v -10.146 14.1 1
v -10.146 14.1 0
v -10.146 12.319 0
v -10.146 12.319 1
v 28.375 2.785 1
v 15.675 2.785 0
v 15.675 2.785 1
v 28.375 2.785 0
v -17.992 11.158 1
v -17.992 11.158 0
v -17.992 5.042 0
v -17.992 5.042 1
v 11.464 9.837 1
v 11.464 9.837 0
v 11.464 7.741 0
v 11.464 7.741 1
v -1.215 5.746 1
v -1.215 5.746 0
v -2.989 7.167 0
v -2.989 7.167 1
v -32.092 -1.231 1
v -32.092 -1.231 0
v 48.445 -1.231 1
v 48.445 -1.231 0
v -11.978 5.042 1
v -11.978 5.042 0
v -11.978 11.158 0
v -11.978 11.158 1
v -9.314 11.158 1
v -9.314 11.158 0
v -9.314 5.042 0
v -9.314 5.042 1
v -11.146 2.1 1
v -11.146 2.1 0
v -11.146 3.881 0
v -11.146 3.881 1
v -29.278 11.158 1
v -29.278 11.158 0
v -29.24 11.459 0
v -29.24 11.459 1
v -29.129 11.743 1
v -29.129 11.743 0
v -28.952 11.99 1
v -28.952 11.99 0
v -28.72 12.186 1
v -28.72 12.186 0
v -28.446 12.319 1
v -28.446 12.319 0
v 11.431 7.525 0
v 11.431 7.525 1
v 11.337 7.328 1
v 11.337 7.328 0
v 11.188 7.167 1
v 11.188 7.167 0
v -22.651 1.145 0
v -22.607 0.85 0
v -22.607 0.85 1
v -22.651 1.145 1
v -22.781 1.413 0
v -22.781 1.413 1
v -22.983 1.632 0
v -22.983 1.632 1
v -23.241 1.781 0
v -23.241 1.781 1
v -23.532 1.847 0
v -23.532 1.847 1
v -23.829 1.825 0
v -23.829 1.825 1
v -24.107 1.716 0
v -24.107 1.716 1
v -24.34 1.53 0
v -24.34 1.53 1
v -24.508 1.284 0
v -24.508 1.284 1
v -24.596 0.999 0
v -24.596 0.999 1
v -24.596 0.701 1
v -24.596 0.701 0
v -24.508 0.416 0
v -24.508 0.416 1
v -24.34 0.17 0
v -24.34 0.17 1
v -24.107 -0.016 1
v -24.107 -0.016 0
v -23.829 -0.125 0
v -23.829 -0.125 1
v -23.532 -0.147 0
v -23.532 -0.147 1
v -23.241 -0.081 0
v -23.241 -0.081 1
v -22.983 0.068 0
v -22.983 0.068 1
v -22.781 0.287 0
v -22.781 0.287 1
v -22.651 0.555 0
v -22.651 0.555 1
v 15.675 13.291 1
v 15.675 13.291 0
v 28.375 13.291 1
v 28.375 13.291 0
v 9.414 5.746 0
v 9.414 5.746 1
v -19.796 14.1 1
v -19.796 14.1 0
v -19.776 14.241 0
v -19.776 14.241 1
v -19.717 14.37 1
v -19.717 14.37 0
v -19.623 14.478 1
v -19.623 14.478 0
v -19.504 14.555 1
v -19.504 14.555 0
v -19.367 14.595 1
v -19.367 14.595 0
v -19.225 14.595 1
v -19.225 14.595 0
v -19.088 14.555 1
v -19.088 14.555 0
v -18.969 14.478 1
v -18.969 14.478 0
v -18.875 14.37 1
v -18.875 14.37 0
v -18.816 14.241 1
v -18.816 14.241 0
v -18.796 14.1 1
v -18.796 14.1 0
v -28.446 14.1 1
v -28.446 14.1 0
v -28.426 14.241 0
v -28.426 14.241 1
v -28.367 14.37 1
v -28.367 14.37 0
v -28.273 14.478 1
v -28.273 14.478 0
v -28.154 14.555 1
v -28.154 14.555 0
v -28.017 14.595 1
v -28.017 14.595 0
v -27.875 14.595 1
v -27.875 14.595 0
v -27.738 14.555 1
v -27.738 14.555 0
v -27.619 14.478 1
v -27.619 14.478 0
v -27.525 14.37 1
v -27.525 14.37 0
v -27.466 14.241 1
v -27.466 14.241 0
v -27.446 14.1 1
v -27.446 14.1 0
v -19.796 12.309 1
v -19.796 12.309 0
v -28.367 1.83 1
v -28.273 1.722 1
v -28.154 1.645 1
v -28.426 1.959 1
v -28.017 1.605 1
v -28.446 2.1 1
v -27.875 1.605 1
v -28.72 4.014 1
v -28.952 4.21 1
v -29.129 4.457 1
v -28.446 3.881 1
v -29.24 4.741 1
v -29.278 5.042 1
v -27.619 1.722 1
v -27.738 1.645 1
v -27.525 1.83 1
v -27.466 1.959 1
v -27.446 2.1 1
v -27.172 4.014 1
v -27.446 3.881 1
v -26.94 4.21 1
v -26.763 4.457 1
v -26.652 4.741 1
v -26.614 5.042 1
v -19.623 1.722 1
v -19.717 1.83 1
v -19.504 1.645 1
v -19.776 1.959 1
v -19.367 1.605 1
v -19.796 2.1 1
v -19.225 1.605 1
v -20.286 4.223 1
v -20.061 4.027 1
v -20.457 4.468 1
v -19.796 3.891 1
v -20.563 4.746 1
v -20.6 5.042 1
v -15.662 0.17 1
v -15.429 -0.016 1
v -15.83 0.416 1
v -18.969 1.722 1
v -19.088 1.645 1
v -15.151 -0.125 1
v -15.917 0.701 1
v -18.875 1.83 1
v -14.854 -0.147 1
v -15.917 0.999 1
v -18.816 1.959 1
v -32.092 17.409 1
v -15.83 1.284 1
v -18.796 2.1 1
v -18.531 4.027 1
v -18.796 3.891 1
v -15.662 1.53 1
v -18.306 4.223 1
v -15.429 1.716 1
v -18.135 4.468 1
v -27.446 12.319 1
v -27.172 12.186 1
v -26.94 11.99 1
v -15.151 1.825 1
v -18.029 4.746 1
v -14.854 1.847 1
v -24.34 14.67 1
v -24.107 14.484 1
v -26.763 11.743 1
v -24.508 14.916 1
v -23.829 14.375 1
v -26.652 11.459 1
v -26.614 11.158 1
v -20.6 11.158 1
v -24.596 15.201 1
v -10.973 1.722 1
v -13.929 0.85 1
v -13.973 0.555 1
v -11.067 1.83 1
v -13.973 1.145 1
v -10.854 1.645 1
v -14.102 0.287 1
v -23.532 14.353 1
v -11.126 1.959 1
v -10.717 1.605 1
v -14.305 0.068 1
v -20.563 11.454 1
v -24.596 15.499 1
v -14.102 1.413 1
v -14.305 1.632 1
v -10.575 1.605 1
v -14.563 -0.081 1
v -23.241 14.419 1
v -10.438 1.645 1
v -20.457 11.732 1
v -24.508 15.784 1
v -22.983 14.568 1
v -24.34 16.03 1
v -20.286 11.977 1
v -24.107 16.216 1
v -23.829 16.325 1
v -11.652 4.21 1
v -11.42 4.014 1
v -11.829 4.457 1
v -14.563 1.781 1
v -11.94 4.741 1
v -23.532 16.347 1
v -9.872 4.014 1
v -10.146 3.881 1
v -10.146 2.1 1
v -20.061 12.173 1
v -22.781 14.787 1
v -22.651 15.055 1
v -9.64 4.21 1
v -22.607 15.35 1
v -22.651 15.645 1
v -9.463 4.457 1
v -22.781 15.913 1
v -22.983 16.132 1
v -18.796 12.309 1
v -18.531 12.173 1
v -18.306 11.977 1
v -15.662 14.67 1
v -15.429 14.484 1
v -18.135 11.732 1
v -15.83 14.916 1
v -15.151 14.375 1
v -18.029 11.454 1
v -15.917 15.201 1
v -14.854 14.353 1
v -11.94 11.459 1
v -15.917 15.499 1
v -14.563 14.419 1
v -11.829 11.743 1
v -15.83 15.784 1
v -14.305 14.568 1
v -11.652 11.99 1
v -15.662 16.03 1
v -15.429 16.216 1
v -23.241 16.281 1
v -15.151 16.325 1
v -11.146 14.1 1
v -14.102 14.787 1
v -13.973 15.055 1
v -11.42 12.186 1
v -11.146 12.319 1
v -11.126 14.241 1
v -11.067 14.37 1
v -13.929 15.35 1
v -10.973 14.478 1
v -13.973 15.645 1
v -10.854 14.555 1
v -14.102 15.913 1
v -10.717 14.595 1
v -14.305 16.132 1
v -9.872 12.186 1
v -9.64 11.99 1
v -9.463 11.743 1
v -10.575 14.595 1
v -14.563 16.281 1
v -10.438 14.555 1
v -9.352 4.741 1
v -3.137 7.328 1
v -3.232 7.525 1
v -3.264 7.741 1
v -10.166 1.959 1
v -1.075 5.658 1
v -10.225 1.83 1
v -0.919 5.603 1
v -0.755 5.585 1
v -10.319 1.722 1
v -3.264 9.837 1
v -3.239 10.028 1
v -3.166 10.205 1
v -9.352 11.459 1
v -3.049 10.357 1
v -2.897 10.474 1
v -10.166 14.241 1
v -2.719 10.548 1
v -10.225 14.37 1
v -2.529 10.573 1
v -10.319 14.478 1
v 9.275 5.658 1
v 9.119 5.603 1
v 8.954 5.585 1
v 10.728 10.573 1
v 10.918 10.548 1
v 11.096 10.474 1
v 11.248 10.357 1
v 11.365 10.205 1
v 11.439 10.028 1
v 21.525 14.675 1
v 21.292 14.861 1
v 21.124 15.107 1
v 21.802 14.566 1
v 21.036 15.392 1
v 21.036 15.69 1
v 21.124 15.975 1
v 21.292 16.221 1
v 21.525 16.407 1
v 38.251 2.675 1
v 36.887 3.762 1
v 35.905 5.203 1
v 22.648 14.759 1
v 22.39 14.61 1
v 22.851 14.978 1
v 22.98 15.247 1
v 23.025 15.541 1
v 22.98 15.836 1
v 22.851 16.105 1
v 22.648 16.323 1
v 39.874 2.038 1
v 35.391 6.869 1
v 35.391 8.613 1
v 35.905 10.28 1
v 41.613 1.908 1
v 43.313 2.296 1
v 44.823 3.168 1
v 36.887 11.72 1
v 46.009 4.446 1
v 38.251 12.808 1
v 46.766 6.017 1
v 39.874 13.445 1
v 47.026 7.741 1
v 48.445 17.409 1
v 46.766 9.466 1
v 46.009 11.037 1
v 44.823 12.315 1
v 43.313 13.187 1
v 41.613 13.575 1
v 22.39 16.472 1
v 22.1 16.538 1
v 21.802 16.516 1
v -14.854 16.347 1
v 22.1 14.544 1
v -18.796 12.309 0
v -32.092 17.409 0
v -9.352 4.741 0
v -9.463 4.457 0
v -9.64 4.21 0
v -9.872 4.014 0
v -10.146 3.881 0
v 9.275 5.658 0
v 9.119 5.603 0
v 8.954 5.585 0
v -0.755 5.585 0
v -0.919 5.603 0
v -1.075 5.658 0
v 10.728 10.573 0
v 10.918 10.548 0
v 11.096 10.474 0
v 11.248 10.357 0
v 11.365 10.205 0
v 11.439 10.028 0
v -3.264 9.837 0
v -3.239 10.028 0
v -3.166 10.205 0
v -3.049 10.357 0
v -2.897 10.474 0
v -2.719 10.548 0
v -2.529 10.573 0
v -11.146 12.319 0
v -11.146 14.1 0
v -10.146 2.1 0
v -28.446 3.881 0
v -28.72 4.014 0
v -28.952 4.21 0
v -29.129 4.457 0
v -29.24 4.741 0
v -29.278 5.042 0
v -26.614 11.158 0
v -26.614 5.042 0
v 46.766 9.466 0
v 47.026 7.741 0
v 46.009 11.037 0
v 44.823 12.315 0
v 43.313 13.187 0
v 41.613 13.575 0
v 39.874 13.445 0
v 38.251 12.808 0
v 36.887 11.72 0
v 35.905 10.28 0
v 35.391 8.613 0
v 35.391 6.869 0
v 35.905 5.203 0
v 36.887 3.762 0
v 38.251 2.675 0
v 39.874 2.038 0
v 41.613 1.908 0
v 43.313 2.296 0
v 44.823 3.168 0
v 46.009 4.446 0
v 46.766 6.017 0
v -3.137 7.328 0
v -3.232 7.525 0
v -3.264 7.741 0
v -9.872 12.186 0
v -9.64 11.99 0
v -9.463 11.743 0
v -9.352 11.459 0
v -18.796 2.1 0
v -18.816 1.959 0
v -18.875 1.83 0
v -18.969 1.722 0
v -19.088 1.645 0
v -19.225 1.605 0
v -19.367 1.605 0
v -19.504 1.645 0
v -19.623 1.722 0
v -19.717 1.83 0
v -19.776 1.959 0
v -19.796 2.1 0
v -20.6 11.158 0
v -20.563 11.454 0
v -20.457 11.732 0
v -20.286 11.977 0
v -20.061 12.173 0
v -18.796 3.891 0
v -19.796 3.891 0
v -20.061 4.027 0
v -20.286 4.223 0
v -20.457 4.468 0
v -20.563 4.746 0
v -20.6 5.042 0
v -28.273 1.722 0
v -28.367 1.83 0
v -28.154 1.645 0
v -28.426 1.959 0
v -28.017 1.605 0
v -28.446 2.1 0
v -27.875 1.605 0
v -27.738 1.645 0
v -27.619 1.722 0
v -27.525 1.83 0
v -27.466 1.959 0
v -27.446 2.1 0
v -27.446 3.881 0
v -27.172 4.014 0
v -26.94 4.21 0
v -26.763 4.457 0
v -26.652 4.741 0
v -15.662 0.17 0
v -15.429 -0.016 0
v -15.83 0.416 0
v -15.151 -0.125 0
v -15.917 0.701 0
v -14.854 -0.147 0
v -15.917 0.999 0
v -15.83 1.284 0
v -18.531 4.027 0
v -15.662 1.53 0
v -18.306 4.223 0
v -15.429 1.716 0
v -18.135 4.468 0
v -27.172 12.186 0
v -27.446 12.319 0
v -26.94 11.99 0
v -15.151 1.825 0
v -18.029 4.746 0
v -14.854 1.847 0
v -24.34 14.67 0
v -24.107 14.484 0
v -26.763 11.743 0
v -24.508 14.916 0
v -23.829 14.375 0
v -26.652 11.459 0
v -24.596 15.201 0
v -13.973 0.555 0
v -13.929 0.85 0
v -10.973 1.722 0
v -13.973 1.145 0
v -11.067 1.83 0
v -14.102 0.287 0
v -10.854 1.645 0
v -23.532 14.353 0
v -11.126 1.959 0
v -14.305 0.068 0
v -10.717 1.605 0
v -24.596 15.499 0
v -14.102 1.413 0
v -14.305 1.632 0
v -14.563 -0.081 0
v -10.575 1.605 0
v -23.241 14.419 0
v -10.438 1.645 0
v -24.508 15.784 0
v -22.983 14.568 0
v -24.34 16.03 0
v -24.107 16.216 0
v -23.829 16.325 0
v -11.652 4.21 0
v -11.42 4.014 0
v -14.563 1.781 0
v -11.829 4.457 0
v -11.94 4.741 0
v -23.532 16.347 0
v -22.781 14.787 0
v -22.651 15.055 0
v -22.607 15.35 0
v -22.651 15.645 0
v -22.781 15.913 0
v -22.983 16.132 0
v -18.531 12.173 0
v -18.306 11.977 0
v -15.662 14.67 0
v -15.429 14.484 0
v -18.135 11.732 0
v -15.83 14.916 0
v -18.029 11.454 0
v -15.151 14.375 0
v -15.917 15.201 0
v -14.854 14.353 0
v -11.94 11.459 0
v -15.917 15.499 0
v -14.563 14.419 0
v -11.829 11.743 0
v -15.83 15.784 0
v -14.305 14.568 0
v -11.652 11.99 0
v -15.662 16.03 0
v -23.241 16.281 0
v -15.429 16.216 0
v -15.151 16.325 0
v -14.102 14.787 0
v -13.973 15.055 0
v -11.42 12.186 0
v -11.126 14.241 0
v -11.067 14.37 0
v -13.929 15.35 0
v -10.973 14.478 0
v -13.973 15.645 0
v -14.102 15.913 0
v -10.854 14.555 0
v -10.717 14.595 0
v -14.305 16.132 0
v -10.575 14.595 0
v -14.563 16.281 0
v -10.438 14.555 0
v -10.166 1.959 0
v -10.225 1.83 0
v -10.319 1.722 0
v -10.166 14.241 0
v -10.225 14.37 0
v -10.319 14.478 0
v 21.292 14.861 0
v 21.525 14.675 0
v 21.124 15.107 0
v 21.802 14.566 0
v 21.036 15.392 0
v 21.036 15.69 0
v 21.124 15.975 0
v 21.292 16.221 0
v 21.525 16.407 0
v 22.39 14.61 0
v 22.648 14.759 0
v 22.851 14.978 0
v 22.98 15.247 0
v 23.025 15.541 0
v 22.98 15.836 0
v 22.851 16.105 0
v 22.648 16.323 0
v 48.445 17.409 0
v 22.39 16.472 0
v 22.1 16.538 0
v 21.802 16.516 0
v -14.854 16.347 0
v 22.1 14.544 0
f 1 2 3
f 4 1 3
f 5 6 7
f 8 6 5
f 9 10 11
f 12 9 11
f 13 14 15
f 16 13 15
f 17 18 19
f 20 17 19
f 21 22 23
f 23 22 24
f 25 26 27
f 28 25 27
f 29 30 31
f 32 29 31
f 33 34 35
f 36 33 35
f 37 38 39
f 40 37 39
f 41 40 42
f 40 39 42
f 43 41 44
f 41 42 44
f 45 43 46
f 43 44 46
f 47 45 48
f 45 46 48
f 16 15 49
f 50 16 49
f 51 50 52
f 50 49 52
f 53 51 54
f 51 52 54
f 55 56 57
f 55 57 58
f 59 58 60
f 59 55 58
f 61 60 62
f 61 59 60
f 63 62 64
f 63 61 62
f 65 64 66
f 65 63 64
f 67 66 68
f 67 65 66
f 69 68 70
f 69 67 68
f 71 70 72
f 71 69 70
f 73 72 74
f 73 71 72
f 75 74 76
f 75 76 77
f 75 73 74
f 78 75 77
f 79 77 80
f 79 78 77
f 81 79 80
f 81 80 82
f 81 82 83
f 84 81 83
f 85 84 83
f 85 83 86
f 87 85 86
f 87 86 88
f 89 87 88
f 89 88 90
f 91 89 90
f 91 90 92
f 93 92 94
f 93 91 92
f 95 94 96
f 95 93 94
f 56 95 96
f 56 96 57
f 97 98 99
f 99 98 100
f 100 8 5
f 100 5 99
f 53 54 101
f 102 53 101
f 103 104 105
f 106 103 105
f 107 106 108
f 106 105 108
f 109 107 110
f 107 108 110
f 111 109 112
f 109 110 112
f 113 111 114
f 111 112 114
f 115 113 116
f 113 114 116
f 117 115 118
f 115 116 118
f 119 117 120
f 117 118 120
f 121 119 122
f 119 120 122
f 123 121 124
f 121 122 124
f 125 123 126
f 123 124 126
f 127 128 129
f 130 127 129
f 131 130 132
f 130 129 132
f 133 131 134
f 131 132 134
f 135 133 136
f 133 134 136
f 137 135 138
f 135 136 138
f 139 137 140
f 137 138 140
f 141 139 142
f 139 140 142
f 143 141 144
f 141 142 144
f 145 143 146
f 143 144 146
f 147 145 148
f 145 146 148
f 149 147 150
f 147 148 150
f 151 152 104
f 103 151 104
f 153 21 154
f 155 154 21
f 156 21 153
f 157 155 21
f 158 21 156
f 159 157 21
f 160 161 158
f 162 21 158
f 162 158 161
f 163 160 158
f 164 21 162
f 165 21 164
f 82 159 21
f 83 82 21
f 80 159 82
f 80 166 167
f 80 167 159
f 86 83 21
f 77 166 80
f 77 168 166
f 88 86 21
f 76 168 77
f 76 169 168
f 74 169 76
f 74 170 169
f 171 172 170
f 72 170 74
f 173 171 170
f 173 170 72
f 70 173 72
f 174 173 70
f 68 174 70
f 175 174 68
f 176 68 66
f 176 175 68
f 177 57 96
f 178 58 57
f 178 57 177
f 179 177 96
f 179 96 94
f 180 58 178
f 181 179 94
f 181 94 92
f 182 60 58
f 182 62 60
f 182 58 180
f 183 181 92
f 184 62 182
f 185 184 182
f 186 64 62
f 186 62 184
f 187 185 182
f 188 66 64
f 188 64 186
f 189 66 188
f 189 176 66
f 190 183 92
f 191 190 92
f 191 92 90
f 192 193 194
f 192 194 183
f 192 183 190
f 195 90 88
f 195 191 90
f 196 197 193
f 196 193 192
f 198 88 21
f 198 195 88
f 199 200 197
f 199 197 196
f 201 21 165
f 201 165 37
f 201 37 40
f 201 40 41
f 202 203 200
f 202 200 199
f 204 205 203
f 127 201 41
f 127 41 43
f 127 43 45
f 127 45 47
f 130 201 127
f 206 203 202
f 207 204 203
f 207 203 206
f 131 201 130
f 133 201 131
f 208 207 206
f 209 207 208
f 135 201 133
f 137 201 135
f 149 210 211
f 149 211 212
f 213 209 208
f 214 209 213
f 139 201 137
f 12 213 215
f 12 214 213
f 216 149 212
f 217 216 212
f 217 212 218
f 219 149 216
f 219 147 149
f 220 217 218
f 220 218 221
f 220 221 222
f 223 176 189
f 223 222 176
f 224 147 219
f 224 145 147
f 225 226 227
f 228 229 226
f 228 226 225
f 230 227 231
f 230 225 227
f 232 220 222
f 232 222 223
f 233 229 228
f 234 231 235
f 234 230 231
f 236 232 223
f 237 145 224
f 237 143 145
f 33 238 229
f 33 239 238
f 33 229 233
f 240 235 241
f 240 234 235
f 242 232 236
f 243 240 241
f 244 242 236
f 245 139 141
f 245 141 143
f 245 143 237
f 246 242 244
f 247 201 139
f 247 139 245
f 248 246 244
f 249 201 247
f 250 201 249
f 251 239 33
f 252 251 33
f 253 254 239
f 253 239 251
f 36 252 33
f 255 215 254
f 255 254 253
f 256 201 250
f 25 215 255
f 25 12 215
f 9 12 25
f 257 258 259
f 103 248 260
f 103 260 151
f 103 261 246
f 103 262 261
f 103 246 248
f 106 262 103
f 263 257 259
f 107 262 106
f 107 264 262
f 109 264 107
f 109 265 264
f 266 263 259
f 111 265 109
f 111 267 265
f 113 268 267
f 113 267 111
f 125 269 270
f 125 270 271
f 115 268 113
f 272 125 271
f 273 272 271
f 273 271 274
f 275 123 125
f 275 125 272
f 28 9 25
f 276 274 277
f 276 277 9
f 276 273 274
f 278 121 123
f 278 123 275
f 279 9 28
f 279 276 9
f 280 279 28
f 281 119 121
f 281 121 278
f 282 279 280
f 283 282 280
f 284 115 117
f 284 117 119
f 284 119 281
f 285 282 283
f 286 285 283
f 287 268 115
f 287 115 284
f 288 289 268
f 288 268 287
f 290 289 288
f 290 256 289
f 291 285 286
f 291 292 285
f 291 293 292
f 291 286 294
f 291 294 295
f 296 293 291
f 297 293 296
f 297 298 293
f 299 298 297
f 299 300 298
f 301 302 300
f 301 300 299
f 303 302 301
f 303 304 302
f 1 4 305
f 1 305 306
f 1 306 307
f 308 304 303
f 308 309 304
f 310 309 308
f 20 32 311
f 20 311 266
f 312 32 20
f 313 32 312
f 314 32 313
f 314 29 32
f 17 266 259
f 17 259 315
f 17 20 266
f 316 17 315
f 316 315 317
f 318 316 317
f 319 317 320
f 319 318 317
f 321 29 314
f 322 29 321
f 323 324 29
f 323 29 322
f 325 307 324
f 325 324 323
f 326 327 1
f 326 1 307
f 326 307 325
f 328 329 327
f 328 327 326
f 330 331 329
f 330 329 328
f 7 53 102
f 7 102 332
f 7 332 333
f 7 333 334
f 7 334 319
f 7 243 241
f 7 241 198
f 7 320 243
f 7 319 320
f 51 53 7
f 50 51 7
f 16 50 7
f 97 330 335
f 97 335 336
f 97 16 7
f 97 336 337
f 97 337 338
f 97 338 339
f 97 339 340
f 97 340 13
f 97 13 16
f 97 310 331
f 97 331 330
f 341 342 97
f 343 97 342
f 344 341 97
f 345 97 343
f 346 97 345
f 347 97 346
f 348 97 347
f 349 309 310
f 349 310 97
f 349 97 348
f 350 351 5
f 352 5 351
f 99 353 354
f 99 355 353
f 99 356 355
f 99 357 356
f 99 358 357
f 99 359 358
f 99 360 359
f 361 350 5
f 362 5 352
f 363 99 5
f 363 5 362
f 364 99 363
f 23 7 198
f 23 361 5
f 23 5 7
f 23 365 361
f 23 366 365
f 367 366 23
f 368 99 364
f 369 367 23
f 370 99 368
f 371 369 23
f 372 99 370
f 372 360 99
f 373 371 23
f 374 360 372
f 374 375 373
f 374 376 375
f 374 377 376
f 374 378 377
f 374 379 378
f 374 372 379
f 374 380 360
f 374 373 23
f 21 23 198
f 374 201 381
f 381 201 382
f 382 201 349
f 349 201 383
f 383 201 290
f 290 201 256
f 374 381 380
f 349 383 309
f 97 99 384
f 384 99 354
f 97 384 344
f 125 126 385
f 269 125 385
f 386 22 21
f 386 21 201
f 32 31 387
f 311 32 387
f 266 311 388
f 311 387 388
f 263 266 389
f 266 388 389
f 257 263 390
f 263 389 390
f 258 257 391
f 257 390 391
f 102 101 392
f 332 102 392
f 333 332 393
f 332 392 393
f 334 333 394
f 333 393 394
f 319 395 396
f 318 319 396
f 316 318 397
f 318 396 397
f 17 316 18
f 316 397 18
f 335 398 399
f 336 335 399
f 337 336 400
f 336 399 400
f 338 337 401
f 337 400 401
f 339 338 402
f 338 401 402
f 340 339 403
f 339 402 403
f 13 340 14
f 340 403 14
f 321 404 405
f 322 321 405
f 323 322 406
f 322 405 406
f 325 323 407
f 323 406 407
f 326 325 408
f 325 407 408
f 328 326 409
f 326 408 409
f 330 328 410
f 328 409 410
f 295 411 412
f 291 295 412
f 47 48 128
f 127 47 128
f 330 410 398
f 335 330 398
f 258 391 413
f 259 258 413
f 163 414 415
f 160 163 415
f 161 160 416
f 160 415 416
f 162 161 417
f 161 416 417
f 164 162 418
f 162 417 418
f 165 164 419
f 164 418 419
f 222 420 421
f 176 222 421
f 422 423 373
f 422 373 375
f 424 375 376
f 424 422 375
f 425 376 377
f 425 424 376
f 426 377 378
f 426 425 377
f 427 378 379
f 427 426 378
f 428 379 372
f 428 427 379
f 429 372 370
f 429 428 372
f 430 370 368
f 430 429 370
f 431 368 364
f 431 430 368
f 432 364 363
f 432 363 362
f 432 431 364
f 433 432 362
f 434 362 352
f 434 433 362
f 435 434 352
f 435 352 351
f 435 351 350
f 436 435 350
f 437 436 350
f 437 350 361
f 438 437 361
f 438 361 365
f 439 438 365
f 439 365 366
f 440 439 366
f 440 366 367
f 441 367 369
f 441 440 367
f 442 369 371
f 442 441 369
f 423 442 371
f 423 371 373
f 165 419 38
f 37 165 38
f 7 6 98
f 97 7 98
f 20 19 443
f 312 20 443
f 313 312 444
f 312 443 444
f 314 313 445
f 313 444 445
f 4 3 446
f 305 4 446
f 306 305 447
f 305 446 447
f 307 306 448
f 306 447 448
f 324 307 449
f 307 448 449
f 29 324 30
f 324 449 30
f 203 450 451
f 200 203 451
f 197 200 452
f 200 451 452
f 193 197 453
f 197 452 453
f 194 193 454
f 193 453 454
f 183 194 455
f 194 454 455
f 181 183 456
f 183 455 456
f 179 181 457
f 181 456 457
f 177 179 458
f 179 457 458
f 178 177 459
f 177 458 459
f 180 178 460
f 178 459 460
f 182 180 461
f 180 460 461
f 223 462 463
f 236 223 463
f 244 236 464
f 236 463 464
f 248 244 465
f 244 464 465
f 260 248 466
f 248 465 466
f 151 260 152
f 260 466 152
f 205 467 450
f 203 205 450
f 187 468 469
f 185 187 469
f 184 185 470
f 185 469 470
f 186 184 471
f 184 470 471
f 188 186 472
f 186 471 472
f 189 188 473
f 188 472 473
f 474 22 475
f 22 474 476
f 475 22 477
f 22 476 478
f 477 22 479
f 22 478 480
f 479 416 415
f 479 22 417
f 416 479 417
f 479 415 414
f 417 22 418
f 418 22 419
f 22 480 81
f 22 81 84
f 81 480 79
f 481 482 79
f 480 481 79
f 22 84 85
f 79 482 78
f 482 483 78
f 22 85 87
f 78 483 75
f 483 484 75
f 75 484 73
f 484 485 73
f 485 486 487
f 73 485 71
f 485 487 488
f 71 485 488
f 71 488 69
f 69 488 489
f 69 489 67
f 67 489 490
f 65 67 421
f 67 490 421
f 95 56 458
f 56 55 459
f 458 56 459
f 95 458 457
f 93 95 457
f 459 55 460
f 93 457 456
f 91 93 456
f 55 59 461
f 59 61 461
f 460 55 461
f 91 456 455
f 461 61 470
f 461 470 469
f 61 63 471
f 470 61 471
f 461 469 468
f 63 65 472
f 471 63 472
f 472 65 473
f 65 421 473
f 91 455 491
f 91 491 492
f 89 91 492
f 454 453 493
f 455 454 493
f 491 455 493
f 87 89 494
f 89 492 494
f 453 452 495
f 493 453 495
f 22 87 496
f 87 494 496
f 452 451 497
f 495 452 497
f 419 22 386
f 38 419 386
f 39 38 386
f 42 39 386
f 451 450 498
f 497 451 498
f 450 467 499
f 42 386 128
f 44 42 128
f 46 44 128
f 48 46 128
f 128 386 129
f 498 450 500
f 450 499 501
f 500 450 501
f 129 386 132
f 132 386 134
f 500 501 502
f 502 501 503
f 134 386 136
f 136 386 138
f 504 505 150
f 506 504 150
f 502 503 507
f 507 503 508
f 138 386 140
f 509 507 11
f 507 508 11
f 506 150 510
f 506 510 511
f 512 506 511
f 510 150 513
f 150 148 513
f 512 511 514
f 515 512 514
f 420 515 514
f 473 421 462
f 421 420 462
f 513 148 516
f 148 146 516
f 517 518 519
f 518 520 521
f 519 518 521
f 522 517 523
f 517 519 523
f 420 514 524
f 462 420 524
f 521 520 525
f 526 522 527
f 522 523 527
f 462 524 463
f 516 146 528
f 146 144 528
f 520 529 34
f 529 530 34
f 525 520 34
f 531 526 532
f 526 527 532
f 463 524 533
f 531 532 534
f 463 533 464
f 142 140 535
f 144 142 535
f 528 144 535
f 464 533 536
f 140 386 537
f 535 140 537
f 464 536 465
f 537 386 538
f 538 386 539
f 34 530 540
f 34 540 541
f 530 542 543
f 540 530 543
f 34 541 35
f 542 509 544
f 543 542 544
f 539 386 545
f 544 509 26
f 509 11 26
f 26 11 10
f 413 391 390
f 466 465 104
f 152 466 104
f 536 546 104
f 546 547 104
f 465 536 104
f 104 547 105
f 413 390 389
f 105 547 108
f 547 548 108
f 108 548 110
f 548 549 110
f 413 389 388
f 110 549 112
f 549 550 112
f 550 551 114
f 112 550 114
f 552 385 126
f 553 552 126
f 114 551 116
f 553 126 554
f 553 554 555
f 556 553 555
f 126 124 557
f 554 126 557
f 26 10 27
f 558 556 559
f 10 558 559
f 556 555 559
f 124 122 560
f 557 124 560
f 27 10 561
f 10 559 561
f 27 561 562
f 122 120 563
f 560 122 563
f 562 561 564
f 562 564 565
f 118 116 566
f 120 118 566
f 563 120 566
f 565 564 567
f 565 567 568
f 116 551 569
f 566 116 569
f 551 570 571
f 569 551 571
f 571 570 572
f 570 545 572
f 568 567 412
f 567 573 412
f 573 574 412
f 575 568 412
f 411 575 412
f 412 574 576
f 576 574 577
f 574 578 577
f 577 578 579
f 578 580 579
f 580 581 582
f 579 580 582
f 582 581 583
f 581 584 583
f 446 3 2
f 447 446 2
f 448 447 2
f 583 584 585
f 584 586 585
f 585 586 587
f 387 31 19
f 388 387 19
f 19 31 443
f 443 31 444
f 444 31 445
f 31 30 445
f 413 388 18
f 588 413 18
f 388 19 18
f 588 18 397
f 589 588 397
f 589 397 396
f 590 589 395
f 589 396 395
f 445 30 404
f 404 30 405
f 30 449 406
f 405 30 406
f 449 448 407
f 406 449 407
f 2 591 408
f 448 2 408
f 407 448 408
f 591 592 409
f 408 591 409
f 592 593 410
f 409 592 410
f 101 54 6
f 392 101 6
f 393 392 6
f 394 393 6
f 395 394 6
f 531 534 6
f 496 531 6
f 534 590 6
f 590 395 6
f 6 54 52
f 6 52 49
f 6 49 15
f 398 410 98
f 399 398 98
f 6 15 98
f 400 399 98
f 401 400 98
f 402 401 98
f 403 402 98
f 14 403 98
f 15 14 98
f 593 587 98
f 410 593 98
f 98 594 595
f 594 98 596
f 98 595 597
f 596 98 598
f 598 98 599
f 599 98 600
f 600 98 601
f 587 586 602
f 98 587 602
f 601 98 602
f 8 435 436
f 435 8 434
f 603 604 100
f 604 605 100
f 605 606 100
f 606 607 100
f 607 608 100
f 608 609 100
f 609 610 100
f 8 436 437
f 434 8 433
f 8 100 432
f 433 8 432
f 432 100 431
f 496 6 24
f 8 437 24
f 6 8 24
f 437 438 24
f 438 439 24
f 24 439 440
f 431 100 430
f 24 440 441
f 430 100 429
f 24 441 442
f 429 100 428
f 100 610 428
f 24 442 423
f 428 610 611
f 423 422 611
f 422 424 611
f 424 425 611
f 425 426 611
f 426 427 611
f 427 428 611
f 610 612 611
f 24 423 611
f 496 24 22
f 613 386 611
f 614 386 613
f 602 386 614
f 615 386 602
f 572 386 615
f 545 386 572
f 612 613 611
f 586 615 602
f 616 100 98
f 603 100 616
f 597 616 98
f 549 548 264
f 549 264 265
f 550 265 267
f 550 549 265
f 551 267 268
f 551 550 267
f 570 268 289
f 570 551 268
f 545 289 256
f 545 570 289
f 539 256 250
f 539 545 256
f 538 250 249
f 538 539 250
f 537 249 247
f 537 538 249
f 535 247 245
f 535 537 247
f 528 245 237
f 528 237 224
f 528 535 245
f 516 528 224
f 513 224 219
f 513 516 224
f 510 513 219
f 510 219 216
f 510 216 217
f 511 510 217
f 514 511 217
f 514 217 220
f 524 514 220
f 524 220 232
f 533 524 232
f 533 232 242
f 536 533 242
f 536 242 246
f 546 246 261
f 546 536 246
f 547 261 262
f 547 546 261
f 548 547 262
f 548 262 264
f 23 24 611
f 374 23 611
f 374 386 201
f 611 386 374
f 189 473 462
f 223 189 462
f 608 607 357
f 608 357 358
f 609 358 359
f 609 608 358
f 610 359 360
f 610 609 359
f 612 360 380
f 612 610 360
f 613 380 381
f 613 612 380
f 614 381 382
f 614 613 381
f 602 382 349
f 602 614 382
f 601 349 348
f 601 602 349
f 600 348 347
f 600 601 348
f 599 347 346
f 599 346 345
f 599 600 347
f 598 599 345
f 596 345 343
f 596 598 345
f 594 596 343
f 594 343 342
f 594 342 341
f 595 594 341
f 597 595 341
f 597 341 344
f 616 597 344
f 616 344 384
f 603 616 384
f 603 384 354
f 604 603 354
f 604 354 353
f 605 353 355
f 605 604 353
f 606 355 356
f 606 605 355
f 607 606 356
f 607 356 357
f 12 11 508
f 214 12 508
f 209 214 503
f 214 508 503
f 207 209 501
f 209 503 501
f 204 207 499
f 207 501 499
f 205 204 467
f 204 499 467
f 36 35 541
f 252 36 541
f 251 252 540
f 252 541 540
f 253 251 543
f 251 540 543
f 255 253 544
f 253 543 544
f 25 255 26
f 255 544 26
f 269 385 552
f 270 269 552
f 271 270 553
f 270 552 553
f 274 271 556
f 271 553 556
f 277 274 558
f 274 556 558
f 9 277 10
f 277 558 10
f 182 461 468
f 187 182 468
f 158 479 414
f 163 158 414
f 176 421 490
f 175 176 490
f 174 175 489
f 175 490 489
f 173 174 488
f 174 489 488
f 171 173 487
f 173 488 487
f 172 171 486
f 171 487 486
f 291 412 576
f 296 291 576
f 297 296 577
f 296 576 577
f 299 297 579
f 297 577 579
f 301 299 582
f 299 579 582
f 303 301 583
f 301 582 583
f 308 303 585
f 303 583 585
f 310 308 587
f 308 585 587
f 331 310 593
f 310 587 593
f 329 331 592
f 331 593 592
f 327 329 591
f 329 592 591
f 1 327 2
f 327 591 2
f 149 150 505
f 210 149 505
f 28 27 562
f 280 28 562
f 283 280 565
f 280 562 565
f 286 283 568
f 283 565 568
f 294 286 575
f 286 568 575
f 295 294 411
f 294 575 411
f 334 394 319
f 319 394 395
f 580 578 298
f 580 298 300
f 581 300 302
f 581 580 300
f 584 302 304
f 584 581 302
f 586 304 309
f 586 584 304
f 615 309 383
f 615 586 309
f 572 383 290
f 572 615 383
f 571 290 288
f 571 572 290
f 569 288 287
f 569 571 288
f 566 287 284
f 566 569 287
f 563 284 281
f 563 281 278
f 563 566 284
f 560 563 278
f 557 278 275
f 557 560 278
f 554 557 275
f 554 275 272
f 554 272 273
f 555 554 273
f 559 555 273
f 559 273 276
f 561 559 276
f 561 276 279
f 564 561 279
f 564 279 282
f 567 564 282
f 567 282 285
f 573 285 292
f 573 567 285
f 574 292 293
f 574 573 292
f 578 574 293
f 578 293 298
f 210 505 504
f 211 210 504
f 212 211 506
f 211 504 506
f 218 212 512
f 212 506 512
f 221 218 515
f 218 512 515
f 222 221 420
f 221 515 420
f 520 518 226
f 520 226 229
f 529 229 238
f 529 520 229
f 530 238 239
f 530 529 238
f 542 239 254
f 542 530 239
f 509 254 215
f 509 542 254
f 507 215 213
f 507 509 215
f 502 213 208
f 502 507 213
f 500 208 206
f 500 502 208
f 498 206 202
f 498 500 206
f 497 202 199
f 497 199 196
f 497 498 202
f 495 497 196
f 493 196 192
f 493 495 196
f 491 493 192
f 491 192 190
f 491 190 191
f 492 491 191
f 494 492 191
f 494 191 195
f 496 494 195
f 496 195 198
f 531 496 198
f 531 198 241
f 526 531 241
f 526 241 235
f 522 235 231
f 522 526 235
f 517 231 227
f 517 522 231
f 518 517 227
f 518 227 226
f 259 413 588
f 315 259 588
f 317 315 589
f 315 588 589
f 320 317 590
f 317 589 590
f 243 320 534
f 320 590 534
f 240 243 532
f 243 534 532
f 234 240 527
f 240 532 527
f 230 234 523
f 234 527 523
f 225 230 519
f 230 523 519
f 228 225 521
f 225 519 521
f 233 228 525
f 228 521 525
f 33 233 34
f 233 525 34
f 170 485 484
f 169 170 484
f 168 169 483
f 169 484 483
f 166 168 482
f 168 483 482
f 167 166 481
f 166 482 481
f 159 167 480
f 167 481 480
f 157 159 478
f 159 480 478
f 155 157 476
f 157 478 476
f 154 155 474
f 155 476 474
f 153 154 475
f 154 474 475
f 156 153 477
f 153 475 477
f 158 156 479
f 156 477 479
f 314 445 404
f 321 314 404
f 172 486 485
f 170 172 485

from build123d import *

# Parameters (mm, degrees)
SKETCH1_W           = 80.536494558
SKETCH1_H           = 18.639450705
SKETCH1_R           = 1
SKETCH1_W_2         = 12.7
SKETCH1_H_2         = 10.505884886
SKETCH1_R_2         = 5.85
BOSS_EXTRUDE1_DEPTH = 1


with BuildPart() as part:
    # Sketch1 → Boss-Extrude1 (new body)
    with BuildSketch(Plane.XY):
        with Locations((8.176740168, 8.08881823)):
            Rectangle(SKETCH1_W, SKETCH1_H)
        with Locations((-23.606833594, 0.85)):
            Circle(SKETCH1_R, mode=Mode.SUBTRACT)
        with Locations((-14.928531322, 0.85)):
            Circle(SKETCH1_R, mode=Mode.SUBTRACT)
        with BuildLine():
            Line((-1.215095217, 5.746392688), (-2.98864341, 7.166966689))
            ThreePointArc((-2.98864341, 7.166966689), (-3.191938605, 7.422731407), (-3.264469824, 7.741296549))
            Line((-3.264469824, 7.741296549), (-3.264469824, 9.837116478))
            ThreePointArc((-3.264469824, 9.837116478), (-3.048943677, 10.357442625), (-2.52861753, 10.572968772))
            Line((-2.52861753, 10.572968772), (10.728001089, 10.572968772))
            ThreePointArc((10.728001089, 10.572968772), (11.248327236, 10.357442625), (11.463853383, 9.837116478))
            Line((11.463853383, 9.837116478), (11.463853383, 7.741296549))
            ThreePointArc((11.463853383, 7.741296549), (11.391322164, 7.422731407), (11.188026969, 7.166966689))
            Line((11.188026969, 7.166966689), (9.414478776, 5.746392688))
            ThreePointArc((9.414478776, 5.746392688), (9.198232155, 5.626424146), (8.954452897, 5.584870255))
            Line((8.954452897, 5.584870255), (-0.755069338, 5.584870255))
            ThreePointArc((-0.755069338, 5.584870255), (-0.998848596, 5.626424146), (-1.215095217, 5.746392688))
        make_face(mode=Mode.SUBTRACT)
        with Locations((22.024917985, 8.038348308)):
            Rectangle(SKETCH1_W_2, SKETCH1_H_2, mode=Mode.SUBTRACT)
        with Locations((41.175605906, 7.741296549)):
            Circle(SKETCH1_R_2, mode=Mode.SUBTRACT)
        with BuildLine():
            Line((-27.44598473, 14.1), (-27.44598473, 12.318789547))
            ThreePointArc((-27.44598473, 12.318789547), (-26.843437597, 11.871801459), (-26.613964343, 11.157516205))
            Line((-26.613964343, 11.157516205), (-26.613964343, 5.042483795))
            ThreePointArc((-26.613964343, 5.042483795), (-26.843437597, 4.328198541), (-27.44598473, 3.881210453))
            Line((-27.44598473, 3.881210453), (-27.44598473, 2.1))
            ThreePointArc((-27.44598473, 2.1), (-27.94598473, 1.6), (-28.44598473, 2.1))
            Line((-28.44598473, 2.1), (-28.44598473, 3.881210453))
            ThreePointArc((-28.44598473, 3.881210453), (-29.048531864, 4.328198541), (-29.278005117, 5.042483795))
            Line((-29.278005117, 5.042483795), (-29.278005117, 11.157516205))
            ThreePointArc((-29.278005117, 11.157516205), (-29.048531864, 11.871801459), (-28.44598473, 12.318789547))
            Line((-28.44598473, 12.318789547), (-28.44598473, 14.1))
            ThreePointArc((-28.44598473, 14.1), (-27.94598473, 14.6), (-27.44598473, 14.1))
        make_face(mode=Mode.SUBTRACT)
        with BuildLine():
            ThreePointArc((-17.992266615, 5.042483795), (-18.213073344, 4.340452327), (-18.79598473, 3.891210622))
            Line((-18.79598473, 3.891210622), (-18.79598473, 2.1))
            ThreePointArc((-18.79598473, 2.1), (-19.29598473, 1.6), (-19.79598473, 2.1))
            Line((-19.79598473, 2.1), (-19.79598473, 3.891210622))
            ThreePointArc((-19.79598473, 3.891210622), (-20.378896116, 4.340452327), (-20.599702845, 5.042483795))
            Line((-20.599702845, 5.042483795), (-20.599702845, 11.157516205))
            ThreePointArc((-20.599702845, 11.157516205), (-20.378896116, 11.859547673), (-19.79598473, 12.308789378))
            Line((-19.79598473, 12.308789378), (-19.79598473, 14.1))
            ThreePointArc((-19.79598473, 14.1), (-19.29598473, 14.6), (-18.79598473, 14.1))
            Line((-18.79598473, 14.1), (-18.79598473, 12.308789378))
            ThreePointArc((-18.79598473, 12.308789378), (-18.213073344, 11.859547673), (-17.992266615, 11.157516205))
            Line((-17.992266615, 11.157516205), (-17.992266615, 5.042483795))
        make_face(mode=Mode.SUBTRACT)
        with BuildLine():
            Line((-10.14598473, 14.1), (-10.14598473, 12.318789547))
            ThreePointArc((-10.14598473, 12.318789547), (-9.543437597, 11.871801459), (-9.313964343, 11.157516205))
            Line((-9.313964343, 11.157516205), (-9.313964343, 5.042483795))
            ThreePointArc((-9.313964343, 5.042483795), (-9.543437597, 4.328198541), (-10.14598473, 3.881210453))
            Line((-10.14598473, 3.881210453), (-10.14598473, 2.1))
            ThreePointArc((-10.14598473, 2.1), (-10.64598473, 1.6), (-11.14598473, 2.1))
            Line((-11.14598473, 2.1), (-11.14598473, 3.881210453))
            ThreePointArc((-11.14598473, 3.881210453), (-11.748531864, 4.328198541), (-11.978005117, 5.042483795))
            Line((-11.978005117, 5.042483795), (-11.978005117, 11.157516205))
            ThreePointArc((-11.978005117, 11.157516205), (-11.748531864, 11.871801459), (-11.14598473, 12.318789547))
            Line((-11.14598473, 12.318789547), (-11.14598473, 14.1))
            ThreePointArc((-11.14598473, 14.1), (-10.64598473, 14.6), (-10.14598473, 14.1))
        make_face(mode=Mode.SUBTRACT)
        with Locations((-23.606833594, 15.35)):
            Circle(SKETCH1_R, mode=Mode.SUBTRACT)
        with Locations((-14.928531322, 15.35)):
            Circle(SKETCH1_R, mode=Mode.SUBTRACT)
        with Locations((22.024917985, 15.541290751)):
            Circle(SKETCH1_R, mode=Mode.SUBTRACT)
    extrude(amount=BOSS_EXTRUDE1_DEPTH)


solid = part.part
